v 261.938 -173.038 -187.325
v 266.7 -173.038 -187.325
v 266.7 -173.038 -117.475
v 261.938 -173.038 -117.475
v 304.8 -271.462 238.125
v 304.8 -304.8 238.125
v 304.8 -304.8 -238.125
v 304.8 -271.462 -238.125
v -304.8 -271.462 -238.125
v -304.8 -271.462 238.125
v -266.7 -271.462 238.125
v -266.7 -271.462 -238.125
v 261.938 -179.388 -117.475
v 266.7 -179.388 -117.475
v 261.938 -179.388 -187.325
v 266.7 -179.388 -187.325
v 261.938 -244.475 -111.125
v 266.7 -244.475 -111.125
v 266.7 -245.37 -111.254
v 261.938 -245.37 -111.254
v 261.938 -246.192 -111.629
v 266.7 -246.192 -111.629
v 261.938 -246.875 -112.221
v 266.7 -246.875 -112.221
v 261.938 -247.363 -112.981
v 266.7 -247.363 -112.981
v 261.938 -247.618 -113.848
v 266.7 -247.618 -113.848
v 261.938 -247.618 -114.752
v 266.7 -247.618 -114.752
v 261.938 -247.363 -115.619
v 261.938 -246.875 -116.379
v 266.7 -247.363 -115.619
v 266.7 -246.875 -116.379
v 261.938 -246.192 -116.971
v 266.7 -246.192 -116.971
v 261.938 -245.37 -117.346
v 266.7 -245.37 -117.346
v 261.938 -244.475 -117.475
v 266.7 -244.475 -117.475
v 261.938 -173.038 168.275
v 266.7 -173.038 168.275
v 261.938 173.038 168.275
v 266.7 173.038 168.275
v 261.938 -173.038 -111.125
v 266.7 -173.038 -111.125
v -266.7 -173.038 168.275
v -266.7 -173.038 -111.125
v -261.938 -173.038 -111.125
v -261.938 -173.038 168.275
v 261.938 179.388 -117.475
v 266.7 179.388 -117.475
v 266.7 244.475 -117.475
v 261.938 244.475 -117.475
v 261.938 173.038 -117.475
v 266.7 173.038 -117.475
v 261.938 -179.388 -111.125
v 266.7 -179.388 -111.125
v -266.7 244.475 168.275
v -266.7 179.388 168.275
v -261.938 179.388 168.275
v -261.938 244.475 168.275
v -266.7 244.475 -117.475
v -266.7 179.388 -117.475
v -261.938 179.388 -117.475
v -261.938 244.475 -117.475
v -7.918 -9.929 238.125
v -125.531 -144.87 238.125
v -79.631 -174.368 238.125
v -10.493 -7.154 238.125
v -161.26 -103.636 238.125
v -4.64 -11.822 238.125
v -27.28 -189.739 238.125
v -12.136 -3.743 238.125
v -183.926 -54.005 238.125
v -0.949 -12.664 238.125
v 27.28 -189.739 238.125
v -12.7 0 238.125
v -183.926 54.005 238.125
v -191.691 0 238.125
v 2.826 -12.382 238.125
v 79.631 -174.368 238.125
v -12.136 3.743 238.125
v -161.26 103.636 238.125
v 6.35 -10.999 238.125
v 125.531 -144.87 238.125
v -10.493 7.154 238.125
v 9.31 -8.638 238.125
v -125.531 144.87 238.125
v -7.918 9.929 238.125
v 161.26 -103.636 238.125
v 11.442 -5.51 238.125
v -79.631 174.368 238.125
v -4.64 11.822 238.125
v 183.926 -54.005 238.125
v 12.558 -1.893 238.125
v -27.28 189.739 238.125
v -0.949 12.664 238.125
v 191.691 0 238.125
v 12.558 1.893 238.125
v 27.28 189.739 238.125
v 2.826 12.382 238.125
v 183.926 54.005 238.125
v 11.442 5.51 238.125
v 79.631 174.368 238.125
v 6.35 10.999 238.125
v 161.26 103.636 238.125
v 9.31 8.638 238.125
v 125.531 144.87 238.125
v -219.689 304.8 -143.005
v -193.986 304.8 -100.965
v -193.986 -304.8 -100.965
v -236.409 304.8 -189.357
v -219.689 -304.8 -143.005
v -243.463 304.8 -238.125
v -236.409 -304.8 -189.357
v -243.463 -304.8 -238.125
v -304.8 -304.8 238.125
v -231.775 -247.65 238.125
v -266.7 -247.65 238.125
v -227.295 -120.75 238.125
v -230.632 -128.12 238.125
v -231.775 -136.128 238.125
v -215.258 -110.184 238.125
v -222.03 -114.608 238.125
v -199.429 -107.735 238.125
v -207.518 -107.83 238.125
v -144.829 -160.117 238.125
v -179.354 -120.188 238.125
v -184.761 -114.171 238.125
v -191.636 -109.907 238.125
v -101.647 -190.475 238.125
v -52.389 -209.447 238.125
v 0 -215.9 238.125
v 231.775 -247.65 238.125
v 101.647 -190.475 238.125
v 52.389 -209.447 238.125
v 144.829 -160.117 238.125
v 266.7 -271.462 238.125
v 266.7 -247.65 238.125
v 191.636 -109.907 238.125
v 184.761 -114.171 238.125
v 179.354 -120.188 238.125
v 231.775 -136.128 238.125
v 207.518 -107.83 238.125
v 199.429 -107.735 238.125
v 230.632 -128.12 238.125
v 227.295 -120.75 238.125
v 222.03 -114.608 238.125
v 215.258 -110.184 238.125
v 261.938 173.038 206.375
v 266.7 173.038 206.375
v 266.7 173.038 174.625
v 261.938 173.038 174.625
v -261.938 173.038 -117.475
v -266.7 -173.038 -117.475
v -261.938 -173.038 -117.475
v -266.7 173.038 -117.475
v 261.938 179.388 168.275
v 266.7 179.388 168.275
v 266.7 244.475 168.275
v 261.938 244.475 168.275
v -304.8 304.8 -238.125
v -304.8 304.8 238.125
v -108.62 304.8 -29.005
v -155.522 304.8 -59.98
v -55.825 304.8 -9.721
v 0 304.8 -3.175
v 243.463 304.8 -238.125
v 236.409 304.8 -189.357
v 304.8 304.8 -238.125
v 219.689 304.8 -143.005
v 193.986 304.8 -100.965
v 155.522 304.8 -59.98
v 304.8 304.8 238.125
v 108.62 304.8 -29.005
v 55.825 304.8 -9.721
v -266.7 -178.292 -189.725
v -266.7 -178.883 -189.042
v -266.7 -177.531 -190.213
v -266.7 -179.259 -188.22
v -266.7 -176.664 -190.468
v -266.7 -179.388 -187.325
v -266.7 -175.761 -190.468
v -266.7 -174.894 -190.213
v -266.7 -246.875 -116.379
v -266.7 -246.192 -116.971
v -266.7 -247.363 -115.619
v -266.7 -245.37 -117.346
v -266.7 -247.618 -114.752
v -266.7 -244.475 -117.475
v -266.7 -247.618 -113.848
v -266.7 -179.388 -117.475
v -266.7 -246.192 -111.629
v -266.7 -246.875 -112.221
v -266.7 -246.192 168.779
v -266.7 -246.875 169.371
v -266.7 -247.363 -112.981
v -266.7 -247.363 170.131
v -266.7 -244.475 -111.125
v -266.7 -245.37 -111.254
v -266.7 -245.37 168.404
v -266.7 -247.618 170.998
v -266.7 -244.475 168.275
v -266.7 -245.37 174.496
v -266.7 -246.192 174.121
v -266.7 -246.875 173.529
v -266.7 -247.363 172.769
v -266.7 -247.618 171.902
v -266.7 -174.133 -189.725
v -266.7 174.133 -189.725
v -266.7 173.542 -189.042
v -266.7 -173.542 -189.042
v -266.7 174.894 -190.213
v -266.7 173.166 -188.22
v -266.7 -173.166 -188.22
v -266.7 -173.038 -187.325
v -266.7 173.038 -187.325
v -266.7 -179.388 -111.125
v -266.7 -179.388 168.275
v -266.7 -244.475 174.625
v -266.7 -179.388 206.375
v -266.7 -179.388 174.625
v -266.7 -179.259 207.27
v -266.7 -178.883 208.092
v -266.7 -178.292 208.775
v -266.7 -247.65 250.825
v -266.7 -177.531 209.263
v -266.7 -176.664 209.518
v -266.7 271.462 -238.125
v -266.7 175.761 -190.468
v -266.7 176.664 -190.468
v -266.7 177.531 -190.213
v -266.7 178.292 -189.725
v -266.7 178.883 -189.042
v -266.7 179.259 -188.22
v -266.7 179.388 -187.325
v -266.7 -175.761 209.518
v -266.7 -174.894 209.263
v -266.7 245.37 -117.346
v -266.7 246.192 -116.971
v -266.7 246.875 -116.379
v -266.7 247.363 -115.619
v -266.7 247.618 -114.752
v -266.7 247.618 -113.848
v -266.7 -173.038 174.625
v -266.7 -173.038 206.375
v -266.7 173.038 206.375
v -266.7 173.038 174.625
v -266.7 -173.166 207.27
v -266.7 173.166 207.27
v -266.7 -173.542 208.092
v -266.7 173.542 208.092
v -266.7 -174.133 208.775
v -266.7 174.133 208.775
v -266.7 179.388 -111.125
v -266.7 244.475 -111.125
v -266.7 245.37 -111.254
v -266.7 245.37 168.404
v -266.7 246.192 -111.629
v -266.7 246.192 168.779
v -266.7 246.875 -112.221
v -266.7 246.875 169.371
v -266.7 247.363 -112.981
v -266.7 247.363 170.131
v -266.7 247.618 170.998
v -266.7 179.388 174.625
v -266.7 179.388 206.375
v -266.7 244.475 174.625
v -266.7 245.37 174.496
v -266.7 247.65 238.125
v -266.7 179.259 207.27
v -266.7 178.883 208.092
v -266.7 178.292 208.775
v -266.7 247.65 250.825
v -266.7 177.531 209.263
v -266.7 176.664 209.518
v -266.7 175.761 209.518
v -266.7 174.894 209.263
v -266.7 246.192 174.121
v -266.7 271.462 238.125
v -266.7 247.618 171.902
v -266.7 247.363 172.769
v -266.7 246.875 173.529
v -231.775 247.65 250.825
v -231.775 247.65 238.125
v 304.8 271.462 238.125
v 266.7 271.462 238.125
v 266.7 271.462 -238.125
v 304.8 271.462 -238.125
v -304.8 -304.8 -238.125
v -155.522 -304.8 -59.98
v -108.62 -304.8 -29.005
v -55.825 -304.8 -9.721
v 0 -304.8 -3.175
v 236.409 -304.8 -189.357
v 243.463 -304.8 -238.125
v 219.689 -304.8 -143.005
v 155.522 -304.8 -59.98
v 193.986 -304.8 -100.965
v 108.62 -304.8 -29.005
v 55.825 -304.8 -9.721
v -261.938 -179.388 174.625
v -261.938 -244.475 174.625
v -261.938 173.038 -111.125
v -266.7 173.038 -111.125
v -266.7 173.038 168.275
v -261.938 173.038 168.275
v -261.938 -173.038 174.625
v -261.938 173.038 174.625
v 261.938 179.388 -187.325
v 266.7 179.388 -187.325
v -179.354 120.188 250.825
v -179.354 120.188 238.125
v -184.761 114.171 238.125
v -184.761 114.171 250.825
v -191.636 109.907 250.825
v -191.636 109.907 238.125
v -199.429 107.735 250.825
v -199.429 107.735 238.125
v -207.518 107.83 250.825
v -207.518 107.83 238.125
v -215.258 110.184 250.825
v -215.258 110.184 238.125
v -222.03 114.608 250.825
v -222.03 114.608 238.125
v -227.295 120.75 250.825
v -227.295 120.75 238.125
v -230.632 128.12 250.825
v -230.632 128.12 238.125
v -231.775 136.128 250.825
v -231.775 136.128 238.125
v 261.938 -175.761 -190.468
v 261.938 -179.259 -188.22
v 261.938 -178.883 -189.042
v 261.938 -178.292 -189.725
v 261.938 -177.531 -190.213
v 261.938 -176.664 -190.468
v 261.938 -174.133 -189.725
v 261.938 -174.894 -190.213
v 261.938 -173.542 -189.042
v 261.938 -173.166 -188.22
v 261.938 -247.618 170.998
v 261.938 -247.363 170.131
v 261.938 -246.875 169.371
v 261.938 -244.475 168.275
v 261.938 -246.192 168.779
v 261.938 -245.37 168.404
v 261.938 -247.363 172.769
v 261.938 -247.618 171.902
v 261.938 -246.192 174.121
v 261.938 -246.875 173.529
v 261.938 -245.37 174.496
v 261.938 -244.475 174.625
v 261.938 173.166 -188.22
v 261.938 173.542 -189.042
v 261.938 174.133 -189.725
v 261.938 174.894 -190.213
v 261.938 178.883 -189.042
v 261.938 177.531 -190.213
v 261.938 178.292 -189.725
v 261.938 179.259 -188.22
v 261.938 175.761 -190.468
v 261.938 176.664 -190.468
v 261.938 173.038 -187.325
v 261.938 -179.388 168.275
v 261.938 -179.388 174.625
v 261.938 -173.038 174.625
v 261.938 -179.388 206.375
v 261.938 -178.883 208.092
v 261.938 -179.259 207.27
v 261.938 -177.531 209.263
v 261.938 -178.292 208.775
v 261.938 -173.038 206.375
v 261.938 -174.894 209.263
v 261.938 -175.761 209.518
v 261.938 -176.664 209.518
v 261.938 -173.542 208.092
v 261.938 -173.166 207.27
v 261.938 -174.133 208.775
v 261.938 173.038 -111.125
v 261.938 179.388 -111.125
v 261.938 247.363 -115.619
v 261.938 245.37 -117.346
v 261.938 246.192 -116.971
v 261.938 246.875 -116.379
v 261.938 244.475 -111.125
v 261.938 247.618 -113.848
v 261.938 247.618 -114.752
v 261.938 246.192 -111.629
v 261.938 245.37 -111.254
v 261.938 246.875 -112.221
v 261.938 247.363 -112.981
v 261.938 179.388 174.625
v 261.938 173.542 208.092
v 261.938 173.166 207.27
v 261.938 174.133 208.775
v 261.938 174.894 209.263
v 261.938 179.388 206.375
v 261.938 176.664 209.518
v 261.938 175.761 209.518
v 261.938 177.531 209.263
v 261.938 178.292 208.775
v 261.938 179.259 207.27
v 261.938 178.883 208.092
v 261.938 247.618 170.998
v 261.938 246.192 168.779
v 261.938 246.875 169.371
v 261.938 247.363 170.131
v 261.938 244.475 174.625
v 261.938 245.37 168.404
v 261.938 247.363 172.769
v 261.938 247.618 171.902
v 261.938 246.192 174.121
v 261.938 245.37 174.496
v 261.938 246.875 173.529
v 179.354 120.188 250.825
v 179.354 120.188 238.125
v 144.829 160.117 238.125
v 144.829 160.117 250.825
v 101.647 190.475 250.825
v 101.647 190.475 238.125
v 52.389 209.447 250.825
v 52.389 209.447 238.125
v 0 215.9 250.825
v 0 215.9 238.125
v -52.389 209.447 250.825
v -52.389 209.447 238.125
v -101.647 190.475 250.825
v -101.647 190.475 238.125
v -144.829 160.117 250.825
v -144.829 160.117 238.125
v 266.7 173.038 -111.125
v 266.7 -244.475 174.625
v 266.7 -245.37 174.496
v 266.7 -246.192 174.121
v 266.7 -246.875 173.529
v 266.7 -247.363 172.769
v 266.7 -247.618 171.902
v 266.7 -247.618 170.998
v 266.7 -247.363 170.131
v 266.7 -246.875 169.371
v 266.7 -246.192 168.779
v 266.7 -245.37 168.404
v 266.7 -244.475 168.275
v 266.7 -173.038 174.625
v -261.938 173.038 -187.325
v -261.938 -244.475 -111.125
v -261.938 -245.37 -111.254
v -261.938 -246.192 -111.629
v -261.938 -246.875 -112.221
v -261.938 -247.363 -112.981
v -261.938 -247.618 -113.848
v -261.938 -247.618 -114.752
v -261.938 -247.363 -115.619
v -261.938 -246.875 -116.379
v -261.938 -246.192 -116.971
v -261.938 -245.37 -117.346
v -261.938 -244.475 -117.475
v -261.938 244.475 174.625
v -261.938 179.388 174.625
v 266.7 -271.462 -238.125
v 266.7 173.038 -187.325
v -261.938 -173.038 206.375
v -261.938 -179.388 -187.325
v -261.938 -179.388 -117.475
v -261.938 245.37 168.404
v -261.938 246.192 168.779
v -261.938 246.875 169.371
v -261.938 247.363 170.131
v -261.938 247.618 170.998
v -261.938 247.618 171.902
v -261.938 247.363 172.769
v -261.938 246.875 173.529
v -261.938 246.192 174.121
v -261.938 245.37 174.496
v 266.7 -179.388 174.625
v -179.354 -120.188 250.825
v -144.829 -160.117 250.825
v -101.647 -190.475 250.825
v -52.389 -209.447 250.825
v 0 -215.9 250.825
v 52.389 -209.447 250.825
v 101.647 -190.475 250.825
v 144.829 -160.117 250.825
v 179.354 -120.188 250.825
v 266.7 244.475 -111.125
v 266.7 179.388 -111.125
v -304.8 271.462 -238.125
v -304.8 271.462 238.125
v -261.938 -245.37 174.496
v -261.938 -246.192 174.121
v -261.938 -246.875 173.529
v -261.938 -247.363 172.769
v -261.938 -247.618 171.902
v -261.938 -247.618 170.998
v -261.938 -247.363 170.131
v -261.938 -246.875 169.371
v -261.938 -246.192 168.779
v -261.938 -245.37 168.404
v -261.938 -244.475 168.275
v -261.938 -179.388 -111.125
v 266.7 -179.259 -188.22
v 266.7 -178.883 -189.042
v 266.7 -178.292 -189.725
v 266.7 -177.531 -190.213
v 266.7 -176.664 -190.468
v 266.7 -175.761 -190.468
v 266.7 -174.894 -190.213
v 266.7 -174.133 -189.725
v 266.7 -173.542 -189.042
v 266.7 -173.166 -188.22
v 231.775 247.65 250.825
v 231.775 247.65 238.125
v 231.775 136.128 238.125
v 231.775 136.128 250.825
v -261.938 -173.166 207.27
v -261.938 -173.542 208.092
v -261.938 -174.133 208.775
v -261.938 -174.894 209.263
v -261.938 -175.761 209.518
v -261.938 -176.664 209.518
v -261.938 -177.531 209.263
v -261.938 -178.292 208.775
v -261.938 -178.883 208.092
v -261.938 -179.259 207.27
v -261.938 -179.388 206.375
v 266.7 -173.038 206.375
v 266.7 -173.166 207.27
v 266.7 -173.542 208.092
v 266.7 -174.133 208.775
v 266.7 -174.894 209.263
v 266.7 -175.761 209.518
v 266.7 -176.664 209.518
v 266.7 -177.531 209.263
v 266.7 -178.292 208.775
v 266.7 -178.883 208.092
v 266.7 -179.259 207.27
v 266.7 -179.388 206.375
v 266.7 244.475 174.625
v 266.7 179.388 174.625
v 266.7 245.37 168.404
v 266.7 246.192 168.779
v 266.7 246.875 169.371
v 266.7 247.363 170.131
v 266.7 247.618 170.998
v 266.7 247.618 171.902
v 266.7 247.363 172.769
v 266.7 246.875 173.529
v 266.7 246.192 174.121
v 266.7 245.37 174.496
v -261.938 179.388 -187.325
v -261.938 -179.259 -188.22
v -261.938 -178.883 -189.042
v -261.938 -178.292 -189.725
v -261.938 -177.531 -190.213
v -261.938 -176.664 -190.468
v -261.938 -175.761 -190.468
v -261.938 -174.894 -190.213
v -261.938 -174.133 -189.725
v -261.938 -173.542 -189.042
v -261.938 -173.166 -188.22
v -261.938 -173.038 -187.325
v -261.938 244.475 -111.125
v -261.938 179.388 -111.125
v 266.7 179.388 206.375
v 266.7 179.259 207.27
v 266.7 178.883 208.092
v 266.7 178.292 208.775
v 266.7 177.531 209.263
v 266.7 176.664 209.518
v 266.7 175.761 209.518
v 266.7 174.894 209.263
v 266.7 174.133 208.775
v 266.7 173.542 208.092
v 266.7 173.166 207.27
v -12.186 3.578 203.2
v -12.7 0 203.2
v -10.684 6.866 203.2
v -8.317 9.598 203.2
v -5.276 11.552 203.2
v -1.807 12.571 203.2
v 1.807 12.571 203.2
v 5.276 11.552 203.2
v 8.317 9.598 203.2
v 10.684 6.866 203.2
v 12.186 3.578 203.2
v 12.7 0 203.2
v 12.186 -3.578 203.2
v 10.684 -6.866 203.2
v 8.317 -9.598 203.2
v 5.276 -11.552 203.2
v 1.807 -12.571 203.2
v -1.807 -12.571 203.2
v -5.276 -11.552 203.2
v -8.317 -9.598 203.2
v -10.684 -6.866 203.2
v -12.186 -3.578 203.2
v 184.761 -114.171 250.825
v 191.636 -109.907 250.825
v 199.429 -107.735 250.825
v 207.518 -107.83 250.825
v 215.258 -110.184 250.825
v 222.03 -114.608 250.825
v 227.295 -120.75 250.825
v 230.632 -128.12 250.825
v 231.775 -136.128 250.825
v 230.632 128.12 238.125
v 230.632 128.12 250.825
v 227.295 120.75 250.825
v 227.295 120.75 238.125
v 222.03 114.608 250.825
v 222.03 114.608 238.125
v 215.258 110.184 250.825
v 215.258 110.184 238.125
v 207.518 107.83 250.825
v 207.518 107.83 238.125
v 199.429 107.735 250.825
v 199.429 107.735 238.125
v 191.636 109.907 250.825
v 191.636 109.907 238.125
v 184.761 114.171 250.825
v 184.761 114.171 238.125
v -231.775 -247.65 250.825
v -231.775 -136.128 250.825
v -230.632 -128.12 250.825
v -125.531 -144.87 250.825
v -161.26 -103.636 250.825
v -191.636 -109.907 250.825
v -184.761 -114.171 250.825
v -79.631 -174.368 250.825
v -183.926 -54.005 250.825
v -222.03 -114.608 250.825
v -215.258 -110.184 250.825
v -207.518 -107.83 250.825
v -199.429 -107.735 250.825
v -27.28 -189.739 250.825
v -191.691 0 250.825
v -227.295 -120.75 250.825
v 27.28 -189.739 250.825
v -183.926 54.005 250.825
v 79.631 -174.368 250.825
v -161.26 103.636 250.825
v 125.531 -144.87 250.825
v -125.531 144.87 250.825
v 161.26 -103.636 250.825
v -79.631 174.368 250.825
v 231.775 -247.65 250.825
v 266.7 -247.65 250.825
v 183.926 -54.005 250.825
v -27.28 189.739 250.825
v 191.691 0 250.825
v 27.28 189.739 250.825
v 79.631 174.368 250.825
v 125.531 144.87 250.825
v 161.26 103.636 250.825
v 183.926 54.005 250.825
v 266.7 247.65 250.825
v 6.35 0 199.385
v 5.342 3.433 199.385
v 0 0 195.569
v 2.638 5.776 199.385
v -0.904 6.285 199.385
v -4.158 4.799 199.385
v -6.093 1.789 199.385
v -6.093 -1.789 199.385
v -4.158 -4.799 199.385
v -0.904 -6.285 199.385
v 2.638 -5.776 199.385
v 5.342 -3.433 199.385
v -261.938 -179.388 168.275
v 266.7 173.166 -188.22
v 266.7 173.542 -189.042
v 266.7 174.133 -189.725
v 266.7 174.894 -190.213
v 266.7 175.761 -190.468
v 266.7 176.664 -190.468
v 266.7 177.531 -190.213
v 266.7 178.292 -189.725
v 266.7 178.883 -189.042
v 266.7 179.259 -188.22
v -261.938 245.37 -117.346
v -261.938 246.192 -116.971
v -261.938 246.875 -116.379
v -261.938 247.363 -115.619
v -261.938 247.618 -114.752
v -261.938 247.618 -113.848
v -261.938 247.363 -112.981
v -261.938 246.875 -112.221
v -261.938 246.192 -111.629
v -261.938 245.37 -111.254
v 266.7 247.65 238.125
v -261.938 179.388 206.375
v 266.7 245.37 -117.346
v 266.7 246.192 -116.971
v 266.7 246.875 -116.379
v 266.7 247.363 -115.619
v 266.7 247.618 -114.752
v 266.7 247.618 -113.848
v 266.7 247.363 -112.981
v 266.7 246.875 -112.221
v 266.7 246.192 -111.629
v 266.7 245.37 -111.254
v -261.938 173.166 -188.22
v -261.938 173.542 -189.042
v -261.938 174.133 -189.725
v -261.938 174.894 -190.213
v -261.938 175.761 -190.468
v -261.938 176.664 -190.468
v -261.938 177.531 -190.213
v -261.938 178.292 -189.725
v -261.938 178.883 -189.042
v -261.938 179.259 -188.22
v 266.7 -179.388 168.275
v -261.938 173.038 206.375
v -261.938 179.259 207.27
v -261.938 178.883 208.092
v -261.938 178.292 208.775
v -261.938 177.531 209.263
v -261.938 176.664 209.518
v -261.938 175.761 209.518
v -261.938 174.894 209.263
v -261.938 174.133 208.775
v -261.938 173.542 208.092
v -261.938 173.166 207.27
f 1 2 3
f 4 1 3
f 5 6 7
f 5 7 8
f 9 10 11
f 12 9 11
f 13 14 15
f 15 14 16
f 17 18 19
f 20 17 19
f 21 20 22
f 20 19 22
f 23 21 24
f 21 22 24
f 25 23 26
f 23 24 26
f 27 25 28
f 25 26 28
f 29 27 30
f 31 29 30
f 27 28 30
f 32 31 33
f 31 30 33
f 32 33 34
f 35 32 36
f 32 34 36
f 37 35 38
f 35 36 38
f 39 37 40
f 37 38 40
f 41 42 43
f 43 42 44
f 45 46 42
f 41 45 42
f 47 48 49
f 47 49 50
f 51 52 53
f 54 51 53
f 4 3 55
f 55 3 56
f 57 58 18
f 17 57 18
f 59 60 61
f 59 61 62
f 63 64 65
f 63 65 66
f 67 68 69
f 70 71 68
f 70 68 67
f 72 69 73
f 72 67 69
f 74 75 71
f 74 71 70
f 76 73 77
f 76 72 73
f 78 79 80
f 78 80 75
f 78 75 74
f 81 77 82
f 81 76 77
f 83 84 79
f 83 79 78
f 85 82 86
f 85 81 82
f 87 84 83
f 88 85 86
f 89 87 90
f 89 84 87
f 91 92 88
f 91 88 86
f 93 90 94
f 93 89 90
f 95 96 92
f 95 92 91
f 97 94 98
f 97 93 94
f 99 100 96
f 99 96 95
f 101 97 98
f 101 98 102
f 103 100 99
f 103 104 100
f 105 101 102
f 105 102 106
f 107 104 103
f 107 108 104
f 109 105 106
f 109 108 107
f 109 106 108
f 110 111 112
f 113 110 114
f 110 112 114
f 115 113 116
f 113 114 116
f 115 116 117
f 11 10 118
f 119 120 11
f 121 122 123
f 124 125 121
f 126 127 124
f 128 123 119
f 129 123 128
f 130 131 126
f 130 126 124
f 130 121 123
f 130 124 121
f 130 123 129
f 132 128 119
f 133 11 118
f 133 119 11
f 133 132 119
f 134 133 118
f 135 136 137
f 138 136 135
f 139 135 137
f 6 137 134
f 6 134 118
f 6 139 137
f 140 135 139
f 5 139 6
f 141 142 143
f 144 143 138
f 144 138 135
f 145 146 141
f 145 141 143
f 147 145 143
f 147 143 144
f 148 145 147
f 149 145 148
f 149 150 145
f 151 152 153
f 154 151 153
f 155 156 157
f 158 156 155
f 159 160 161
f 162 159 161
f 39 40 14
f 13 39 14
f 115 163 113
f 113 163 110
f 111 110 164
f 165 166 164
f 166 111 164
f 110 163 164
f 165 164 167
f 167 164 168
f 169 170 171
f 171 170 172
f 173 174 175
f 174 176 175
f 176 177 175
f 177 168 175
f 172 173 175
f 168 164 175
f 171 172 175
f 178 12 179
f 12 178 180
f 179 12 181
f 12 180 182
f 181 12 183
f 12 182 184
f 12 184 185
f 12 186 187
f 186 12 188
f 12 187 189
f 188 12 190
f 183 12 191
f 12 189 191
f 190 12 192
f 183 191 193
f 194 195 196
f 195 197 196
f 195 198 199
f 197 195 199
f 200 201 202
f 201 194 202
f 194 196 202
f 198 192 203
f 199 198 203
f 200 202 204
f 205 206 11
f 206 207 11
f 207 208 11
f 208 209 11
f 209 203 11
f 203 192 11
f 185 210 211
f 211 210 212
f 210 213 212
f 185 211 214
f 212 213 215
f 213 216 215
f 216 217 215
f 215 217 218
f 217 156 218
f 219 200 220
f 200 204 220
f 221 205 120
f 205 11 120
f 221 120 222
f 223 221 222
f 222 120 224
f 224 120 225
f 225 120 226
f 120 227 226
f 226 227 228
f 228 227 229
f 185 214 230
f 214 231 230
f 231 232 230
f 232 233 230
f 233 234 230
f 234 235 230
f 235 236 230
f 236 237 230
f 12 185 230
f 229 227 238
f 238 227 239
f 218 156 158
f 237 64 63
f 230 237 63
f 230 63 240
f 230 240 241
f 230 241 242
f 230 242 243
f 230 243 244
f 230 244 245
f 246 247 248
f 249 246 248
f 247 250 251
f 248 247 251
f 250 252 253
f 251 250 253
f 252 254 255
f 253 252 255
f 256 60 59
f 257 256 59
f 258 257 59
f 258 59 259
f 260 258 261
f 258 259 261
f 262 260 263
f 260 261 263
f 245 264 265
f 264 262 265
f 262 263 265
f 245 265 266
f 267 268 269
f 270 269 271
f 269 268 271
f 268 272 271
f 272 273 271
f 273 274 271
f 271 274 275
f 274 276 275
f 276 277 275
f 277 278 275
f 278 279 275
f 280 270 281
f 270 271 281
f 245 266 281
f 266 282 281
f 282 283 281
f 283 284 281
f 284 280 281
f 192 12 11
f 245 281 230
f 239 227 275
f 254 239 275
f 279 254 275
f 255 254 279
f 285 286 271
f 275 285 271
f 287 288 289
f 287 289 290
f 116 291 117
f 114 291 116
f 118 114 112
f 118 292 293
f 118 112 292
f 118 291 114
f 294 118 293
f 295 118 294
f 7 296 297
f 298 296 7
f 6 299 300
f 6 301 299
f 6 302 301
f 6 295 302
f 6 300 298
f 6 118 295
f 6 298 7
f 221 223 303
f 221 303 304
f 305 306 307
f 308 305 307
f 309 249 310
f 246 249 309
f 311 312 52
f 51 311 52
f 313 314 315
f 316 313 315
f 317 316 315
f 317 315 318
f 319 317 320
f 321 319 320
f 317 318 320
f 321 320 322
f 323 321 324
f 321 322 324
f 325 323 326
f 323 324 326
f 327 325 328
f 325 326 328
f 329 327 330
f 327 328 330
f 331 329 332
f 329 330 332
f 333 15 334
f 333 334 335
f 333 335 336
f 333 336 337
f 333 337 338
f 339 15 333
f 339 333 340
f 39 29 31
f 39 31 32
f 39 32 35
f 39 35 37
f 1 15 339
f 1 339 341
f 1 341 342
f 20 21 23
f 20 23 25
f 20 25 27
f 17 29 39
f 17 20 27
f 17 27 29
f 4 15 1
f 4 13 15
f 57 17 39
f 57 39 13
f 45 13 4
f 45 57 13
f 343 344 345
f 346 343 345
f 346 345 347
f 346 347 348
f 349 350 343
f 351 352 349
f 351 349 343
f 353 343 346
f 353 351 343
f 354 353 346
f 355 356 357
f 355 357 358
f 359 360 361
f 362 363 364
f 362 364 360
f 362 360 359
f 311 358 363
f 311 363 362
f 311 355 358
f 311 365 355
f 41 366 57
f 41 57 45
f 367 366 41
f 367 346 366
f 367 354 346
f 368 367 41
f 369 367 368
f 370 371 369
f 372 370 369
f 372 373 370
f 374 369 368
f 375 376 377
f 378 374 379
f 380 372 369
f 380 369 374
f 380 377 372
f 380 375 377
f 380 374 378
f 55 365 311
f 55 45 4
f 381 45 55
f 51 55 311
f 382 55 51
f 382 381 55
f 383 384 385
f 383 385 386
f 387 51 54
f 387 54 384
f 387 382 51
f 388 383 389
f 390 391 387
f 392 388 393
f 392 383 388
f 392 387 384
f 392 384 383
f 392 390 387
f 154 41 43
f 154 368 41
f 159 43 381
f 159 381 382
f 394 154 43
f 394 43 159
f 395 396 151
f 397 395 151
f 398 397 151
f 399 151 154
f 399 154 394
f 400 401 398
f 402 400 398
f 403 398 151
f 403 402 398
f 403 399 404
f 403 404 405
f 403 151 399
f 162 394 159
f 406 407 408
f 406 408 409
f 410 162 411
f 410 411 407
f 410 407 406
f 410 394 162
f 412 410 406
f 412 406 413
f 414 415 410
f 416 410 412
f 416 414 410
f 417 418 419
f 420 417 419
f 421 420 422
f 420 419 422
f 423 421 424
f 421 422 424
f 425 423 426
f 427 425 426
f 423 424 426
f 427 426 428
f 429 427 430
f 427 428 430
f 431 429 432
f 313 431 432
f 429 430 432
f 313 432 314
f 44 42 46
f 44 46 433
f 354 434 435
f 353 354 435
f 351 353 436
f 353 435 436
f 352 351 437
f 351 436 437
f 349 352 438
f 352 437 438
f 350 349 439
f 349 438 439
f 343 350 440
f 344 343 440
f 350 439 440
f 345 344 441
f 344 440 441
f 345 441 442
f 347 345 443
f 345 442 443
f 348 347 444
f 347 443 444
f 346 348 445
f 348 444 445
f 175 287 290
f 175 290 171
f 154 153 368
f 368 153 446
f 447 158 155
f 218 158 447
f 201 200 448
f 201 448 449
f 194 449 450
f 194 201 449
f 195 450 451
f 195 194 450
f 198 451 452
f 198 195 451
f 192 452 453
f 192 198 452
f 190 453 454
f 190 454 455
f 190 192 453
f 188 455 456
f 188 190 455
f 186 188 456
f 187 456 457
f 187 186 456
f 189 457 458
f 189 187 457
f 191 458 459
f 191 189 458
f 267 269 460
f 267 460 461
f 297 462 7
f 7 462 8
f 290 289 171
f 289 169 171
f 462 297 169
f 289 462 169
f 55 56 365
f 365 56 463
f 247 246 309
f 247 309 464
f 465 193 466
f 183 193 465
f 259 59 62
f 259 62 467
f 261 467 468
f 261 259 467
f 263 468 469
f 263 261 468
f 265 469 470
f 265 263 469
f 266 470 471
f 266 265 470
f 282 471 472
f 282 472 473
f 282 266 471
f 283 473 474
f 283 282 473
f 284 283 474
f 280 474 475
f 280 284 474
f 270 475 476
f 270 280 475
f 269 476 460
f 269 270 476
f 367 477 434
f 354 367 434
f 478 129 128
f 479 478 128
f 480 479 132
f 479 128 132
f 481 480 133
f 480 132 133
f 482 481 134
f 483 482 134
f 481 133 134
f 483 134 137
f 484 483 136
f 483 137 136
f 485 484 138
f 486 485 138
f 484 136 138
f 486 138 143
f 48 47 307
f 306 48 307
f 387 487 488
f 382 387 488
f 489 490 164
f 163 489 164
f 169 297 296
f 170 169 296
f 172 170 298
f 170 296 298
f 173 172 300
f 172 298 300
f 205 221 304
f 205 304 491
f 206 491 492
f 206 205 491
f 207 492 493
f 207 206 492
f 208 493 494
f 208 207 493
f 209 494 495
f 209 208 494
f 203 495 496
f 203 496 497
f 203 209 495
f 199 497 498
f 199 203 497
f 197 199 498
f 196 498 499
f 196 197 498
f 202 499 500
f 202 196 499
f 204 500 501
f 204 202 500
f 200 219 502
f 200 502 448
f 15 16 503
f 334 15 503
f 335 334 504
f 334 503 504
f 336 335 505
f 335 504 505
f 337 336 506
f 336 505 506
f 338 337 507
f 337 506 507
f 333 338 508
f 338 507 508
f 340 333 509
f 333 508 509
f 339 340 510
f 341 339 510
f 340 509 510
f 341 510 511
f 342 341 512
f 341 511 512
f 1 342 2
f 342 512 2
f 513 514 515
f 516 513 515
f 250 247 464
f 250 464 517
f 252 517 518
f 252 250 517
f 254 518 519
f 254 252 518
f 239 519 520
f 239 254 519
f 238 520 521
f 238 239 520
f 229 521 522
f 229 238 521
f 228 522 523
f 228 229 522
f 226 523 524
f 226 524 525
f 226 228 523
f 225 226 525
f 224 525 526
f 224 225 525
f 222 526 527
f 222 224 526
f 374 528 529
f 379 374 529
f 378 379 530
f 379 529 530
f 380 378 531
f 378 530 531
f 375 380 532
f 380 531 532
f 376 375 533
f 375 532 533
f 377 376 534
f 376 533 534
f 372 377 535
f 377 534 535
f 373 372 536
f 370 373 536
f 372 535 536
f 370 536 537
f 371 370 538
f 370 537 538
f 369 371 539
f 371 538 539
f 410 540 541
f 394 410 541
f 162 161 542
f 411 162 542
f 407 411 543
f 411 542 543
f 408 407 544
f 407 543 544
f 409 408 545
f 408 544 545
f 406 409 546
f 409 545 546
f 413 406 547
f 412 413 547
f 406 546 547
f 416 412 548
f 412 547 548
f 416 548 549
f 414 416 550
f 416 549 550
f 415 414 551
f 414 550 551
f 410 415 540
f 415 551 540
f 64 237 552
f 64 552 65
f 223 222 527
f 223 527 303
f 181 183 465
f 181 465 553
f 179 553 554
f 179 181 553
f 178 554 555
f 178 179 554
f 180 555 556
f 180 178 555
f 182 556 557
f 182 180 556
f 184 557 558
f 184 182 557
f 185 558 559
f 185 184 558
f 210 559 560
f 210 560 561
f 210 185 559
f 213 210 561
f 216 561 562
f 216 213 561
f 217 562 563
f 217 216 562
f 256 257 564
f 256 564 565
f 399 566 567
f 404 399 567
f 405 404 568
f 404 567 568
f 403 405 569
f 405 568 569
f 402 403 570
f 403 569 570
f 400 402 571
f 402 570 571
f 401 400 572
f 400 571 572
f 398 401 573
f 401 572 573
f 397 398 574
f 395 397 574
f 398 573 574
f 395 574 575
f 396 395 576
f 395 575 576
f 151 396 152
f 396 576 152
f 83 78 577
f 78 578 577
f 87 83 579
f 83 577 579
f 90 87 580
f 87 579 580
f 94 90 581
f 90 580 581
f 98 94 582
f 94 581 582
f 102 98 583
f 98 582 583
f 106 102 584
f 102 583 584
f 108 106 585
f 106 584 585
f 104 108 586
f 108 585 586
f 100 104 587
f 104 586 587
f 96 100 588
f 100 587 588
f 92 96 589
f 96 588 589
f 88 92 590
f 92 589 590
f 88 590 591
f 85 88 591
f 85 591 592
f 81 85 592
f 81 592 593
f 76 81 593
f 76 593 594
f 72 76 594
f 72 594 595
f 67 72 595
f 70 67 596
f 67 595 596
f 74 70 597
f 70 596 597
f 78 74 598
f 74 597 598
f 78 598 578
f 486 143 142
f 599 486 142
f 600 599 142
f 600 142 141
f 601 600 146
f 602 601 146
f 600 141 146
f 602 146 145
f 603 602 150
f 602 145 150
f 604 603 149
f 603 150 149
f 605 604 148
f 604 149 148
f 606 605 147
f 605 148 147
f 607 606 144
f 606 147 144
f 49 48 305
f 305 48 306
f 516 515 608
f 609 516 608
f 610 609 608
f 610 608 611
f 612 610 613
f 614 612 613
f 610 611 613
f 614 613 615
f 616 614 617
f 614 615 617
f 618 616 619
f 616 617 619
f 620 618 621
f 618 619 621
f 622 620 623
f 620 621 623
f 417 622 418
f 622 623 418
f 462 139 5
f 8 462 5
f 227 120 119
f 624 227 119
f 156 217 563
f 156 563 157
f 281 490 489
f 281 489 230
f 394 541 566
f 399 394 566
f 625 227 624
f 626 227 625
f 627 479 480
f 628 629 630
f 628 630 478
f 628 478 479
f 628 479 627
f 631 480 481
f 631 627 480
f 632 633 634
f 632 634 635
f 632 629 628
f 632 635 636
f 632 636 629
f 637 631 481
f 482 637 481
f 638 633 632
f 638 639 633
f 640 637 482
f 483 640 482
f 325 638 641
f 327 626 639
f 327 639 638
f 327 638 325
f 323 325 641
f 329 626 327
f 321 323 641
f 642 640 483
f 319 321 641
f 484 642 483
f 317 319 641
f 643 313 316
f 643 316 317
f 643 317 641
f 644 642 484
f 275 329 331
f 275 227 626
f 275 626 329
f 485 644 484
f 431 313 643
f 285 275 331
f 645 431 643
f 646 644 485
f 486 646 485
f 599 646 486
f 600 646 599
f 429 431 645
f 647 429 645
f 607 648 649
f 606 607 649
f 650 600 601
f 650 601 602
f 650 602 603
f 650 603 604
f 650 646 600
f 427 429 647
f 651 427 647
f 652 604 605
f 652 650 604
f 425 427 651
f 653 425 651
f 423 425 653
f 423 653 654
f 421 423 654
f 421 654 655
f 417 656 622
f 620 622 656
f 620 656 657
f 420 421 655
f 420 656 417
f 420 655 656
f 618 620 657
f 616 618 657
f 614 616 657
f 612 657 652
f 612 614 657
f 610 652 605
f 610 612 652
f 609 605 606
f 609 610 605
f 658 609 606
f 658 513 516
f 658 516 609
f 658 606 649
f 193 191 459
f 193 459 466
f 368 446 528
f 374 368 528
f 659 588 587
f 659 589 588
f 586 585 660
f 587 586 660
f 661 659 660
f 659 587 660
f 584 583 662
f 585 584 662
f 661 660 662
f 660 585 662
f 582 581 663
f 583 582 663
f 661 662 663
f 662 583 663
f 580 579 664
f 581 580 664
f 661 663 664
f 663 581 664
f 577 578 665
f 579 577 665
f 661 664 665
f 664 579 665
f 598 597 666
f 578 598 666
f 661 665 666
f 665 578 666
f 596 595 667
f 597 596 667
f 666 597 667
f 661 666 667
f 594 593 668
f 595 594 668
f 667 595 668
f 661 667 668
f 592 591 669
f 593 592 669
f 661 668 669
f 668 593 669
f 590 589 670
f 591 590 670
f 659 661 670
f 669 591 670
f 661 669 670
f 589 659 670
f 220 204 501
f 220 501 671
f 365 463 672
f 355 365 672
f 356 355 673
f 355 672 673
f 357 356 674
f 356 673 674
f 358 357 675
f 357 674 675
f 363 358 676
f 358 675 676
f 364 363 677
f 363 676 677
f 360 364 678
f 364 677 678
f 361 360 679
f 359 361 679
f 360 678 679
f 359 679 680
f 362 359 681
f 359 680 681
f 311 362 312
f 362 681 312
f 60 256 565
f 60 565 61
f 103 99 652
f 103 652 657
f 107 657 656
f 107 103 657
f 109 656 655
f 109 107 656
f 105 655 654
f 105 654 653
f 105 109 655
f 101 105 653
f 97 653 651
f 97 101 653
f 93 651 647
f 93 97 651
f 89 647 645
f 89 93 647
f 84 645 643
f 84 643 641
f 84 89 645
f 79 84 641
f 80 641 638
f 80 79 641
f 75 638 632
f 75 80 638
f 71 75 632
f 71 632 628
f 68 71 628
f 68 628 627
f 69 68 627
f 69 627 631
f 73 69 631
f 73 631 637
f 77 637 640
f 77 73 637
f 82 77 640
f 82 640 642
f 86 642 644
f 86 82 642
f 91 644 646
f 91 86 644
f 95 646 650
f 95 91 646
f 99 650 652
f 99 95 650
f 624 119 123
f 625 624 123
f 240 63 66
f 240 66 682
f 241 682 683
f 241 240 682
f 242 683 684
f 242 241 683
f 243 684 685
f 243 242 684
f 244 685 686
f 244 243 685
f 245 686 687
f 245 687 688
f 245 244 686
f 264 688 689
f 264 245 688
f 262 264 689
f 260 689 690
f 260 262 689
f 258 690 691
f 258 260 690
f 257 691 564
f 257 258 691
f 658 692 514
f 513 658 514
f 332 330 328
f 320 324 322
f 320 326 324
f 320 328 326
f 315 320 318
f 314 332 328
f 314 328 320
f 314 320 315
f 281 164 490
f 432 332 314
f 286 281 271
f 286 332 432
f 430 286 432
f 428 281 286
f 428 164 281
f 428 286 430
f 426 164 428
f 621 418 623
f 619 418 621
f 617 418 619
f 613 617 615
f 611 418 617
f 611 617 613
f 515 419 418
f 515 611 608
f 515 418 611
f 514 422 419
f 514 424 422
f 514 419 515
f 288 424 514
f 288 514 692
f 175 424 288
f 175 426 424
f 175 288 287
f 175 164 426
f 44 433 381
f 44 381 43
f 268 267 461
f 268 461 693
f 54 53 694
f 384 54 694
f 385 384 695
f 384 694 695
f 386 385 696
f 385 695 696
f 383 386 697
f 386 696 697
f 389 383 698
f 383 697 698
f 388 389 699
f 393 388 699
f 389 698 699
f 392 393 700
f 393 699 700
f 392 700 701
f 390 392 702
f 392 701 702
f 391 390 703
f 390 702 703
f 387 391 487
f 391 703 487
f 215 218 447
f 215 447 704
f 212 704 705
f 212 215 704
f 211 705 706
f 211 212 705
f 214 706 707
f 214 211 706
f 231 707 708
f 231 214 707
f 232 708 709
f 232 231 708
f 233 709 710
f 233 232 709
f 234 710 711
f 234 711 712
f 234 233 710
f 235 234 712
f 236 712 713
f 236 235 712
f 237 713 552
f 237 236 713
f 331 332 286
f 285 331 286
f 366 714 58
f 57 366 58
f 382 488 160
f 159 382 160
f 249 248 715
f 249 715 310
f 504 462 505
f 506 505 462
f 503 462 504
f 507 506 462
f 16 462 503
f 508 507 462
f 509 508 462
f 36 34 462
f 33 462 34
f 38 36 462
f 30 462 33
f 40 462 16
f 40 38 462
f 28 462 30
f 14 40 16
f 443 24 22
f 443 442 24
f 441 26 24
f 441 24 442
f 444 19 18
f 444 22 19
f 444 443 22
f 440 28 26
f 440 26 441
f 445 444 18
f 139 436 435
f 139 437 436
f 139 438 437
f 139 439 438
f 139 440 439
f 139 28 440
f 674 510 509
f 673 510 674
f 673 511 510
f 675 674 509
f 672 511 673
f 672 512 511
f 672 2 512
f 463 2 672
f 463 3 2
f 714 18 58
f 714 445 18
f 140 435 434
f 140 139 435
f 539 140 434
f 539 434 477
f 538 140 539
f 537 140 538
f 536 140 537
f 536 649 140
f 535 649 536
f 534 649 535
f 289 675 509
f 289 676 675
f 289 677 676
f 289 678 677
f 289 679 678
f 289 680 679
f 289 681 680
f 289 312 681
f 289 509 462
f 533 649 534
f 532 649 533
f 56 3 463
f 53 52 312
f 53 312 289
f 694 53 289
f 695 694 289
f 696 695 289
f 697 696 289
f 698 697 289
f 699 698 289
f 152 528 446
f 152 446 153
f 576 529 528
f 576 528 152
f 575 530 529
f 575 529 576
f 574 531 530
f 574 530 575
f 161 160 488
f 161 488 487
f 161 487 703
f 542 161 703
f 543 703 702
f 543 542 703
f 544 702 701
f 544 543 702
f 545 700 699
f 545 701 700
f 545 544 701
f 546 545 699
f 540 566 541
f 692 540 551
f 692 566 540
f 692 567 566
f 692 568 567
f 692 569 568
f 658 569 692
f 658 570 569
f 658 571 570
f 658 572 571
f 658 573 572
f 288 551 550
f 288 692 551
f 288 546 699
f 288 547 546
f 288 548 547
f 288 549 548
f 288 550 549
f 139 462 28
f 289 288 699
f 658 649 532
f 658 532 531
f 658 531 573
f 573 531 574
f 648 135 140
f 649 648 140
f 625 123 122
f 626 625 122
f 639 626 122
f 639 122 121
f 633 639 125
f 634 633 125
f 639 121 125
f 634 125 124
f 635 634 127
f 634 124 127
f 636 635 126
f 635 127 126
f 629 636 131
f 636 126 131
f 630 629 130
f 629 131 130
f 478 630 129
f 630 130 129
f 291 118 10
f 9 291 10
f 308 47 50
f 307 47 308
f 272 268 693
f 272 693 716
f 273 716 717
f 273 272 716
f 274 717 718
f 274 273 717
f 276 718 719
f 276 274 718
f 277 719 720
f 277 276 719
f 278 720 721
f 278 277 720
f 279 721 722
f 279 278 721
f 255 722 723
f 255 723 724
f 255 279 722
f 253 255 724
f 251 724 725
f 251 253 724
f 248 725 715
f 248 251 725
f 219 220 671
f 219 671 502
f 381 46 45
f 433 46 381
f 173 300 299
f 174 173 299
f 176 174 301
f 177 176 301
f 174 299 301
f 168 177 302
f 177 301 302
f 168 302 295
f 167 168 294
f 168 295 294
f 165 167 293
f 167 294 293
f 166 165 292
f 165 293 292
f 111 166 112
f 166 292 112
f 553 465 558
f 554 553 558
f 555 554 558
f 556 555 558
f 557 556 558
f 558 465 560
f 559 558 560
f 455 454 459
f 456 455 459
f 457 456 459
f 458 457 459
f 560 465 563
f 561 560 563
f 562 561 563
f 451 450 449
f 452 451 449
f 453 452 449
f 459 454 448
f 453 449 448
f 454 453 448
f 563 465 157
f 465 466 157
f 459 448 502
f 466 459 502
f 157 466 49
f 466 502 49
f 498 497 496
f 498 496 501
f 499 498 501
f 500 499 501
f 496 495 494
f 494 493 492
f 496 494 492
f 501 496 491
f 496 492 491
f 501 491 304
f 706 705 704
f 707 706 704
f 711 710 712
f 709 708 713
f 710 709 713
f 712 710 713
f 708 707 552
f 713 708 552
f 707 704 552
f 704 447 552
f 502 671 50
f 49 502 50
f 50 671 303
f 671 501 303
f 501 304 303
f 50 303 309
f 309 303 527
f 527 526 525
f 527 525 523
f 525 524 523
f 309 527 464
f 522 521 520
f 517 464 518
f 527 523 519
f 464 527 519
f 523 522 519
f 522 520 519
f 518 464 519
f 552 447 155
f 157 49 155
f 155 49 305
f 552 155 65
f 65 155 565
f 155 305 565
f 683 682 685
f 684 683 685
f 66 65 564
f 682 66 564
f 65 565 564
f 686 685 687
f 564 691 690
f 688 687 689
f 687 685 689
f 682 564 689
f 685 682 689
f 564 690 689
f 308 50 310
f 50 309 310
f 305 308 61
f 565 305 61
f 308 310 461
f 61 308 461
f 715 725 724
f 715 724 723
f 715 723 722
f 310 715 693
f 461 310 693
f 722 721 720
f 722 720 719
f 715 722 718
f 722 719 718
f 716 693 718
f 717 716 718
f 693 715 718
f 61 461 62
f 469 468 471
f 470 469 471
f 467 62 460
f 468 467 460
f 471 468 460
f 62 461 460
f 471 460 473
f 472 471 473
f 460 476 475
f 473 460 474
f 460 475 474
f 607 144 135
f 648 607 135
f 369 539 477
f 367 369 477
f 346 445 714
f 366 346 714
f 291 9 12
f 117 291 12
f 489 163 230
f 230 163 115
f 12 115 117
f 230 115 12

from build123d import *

# Parameters (mm, degrees)
F0_W      = 609.6
F0_H      = 609.6
F1_DEPTH  = 238.125
F3_DEPTH  = 609.601
F4_W      = 76.2
F4_H      = 542.925
F5_DEPTH  = 476.251
F6_R      = 191.690625
F7_DEPTH  = 12.7
F9_D      = 25.4
F9_DEPTH  = 34.925
F9_TIP    = 7.6309298617
F10_W     = 346.075
F10_H     = 279.4
F11_DEPTH = 4.7625


# Not quite as in the source:
# - a pattern or mirror of a feature is missing from the dataset's text; its kind, count and spacing are read off the source's solid


with BuildPart() as f1:
    # F0 (on Top) → F1 (new body, symmetric)
    with BuildSketch(Plane.XY):
        Rectangle(F0_W, F0_H)
    extrude(amount=F1_DEPTH, both=True)

    # F2 (on face) → F3 (cut, through all)
    with BuildSketch(Plane.XZ.offset(304.8)):
        with BuildLine():
            ThreePointArc((-193.9860043921, -100.965), (-230.9234761066, -170.6305134371), (-243.68125, -248.44375))
            Line((-243.68125, -248.44375), (243.68125, -248.44375))
            ThreePointArc((243.68125, -248.44375), (230.9234761066, -170.6305134371), (193.9860043921, -100.965))
            ThreePointArc((193.9860043921, -100.965), (0, -3.175), (-193.9860043921, -100.965))
        make_face()
    extrude(amount=-F3_DEPTH, mode=Mode.SUBTRACT)

    # F4 (on face) → F5 (cut, through all)
    with BuildSketch(Plane.XY.offset(238.125)):
        with Locations((304.8, 0)):
            Rectangle(F4_W, F4_H)
        with Locations((-304.8, 0)):
            Rectangle(F4_W, F4_H)
    extrude(amount=-F5_DEPTH, mode=Mode.SUBTRACT)

    # F6 (on face) → F7 (join)
    with BuildSketch(Plane.XY.offset(238.125)):
        with BuildLine():
            ThreePointArc((-231.775, -136.128125), (-211.4711543972, -108.732394395), (-179.3535020392, -120.1878999995))
            ThreePointArc((-179.3535020392, -120.1878999995), (0, -215.9), (179.3535020392, -120.1878999995))
            ThreePointArc((179.3535020392, -120.1878999995), (211.4711543972, -108.732394395), (231.775, -136.128125))
            Line((231.775, -136.128125), (231.775, -247.65))
            Line((231.775, -247.65), (266.7, -247.65))
            Line((266.7, -247.65), (266.7, 247.65))
            Line((266.7, 247.65), (231.775, 247.65))
            Line((231.775, 247.65), (231.775, 136.128125))
            ThreePointArc((231.775, 136.128125), (211.4711543972, 108.732394395), (179.3535020392, 120.1878999995))
            ThreePointArc((179.3535020392, 120.1878999995), (0, 215.9), (-179.3535020392, 120.1878999995))
            ThreePointArc((-179.3535020392, 120.1878999995), (-211.4711543972, 108.732394395), (-231.775, 136.128125))
            Line((-231.775, 136.128125), (-231.775, 247.65))
            Line((-231.775, 247.65), (-266.7, 247.65))
            Line((-266.7, 247.65), (-266.7, -247.65))
            Line((-266.7, -247.65), (-231.775, -247.65))
            Line((-231.775, -247.65), (-231.775, -136.128125))
        make_face()
        Circle(F6_R, mode=Mode.SUBTRACT)
    extrude(amount=F7_DEPTH)

    # F9
    with Locations(Plane.XY.offset(238.125)):
        with Locations((0, 0)):
            Hole(F9_D / 2, depth=F9_DEPTH)
            with Locations((0, 0, -(F9_DEPTH + F9_TIP / 2))):  # 118° drill point
                Cone(0, F9_D / 2, F9_TIP, mode=Mode.SUBTRACT)

    # F10 (on face) → F11 (cut)
    with BuildSketch(Plane.YZ.offset(266.7)):
        with BuildLine():
            Line((179.3875, -117.475), (244.475, -117.475))
            ThreePointArc((244.475, -117.475), (247.65, -114.3), (244.475, -111.125))
            Line((244.475, -111.125), (179.3875, -111.125))
            Line((179.3875, -111.125), (179.3875, 168.275))
            Line((179.3875, 168.275), (244.475, 168.275))
            ThreePointArc((244.475, 168.275), (247.65, 171.45), (244.475, 174.625))
            Line((244.475, 174.625), (179.3875, 174.625))
            Line((179.3875, 174.625), (179.3875, 206.375))
            ThreePointArc((179.3875, 206.375), (176.2125, 209.55), (173.0375, 206.375))
            Line((173.0375, 206.375), (173.0375, 174.625))
            Line((173.0375, 174.625), (-173.0375, 174.625))
            Line((-173.0375, 174.625), (-173.0375, 206.375))
            ThreePointArc((-173.0375, 206.375), (-176.2125, 209.55), (-179.3875, 206.375))
            Line((-179.3875, 206.375), (-179.3875, 174.625))
            Line((-179.3875, 174.625), (-244.475, 174.625))
            ThreePointArc((-244.475, 174.625), (-247.65, 171.45), (-244.475, 168.275))
            Line((-244.475, 168.275), (-179.3875, 168.275))
            Line((-179.3875, 168.275), (-179.3875, -111.125))
            Line((-179.3875, -111.125), (-244.475, -111.125))
            ThreePointArc((-244.475, -111.125), (-247.65, -114.3), (-244.475, -117.475))
            Line((-244.475, -117.475), (-179.3875, -117.475))
            Line((-179.3875, -117.475), (-179.3875, -187.325))
            ThreePointArc((-179.3875, -187.325), (-176.2125, -190.5), (-173.0375, -187.325))
            Line((-173.0375, -187.325), (-173.0375, -117.475))
            Line((-173.0375, -117.475), (173.0375, -117.475))
            Line((173.0375, -117.475), (173.0375, -187.325))
            ThreePointArc((173.0375, -187.325), (176.2125, -190.5), (179.3875, -187.325))
            Line((179.3875, -187.325), (179.3875, -117.475))
        make_face()
        with Locations((0, 28.575)):
            Rectangle(F10_W, F10_H, mode=Mode.SUBTRACT)
    f11 = extrude(amount=-F11_DEPTH, mode=Mode.SUBTRACT)

    # F11_copies: F11 across plane
    add(f11.mirror(Plane(origin=(0, 0, 0), x_dir=(0, 0, -1), z_dir=(-1, 0, 0))), mode=Mode.SUBTRACT)


solid = f1.part
